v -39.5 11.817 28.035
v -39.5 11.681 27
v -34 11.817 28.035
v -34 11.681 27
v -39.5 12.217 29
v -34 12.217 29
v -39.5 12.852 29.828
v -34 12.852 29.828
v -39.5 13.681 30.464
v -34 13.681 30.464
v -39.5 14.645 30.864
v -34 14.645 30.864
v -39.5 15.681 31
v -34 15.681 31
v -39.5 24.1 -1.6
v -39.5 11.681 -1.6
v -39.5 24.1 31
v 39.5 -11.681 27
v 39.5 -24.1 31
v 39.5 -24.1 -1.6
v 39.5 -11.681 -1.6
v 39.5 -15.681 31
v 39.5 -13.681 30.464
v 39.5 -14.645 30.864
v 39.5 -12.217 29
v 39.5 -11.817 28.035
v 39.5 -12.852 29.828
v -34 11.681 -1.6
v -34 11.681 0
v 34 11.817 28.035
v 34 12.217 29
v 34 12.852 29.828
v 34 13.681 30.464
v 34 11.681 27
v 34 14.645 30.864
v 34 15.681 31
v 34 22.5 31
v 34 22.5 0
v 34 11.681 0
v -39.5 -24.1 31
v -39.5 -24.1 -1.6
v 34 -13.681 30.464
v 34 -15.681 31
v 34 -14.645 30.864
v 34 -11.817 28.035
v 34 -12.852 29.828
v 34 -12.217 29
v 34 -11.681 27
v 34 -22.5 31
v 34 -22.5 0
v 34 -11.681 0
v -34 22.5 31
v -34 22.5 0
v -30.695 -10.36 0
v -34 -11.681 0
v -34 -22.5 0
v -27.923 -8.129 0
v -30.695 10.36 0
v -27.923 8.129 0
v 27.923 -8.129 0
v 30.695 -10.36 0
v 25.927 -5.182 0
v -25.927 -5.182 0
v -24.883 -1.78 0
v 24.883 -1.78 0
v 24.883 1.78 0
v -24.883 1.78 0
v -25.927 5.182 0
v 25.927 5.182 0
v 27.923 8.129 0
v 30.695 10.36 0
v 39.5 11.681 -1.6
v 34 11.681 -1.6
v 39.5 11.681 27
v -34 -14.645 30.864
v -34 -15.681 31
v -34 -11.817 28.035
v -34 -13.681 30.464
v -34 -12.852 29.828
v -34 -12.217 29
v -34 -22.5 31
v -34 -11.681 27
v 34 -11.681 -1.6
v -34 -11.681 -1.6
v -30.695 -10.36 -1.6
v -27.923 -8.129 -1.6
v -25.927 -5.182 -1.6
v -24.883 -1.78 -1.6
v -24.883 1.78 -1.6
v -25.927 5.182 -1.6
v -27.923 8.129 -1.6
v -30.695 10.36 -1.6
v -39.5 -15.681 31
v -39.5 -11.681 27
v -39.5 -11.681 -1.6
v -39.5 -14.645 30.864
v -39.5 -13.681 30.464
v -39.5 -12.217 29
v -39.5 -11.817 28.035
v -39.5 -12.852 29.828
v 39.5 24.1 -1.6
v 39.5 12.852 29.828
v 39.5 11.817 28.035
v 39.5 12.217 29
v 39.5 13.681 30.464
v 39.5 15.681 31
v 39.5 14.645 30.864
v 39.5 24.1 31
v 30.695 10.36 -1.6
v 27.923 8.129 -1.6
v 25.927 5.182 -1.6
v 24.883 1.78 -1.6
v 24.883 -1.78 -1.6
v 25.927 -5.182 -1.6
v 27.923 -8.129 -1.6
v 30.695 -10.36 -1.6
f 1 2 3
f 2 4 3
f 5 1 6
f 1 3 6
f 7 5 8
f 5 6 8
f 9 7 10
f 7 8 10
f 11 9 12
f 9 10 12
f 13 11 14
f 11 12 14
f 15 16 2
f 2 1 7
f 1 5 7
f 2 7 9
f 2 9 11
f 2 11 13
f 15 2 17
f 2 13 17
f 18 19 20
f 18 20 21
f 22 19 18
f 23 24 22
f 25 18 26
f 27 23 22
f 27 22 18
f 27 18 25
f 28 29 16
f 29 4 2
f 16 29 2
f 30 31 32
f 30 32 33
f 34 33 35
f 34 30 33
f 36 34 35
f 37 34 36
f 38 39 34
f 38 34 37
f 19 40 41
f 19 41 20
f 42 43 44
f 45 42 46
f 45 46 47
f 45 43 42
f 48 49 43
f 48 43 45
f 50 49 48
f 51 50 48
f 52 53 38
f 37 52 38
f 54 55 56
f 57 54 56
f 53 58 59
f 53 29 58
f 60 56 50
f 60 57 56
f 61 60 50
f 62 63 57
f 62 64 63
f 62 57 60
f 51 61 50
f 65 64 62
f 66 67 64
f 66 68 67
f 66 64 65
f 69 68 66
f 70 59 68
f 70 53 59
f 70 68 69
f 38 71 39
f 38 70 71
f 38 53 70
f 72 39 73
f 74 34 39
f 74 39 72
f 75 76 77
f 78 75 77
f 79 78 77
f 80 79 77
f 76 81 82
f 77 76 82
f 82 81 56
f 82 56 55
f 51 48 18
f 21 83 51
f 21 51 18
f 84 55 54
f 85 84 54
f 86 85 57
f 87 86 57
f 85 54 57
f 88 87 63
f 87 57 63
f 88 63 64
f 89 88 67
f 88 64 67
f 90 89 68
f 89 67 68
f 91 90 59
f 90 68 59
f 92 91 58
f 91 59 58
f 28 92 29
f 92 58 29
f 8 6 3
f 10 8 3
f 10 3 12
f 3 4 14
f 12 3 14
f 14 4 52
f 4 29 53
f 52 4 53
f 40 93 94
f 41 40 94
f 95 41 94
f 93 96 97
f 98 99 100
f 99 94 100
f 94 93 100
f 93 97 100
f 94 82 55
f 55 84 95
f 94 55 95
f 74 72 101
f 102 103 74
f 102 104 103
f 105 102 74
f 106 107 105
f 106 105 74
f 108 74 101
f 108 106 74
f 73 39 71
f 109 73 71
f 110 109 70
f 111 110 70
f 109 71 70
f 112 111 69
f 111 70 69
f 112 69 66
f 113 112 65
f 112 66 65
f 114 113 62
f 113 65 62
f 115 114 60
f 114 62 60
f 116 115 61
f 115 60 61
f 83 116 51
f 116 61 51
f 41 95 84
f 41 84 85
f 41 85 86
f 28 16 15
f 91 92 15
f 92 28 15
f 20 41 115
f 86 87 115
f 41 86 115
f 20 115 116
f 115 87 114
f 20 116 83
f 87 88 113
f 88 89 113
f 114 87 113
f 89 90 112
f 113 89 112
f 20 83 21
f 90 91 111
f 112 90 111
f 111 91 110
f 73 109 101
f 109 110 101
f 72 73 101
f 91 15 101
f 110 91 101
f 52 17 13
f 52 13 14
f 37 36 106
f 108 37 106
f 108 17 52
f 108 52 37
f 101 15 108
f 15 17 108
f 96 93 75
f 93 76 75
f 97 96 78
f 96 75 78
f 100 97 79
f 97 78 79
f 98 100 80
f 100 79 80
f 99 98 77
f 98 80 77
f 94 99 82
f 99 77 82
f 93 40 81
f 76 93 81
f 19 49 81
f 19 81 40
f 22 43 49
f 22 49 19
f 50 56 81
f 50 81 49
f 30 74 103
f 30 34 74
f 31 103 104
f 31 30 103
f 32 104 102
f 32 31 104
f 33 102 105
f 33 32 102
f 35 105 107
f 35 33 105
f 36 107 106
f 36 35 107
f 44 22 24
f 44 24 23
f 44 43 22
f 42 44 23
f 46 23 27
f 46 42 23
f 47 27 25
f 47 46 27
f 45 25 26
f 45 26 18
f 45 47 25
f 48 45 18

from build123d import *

# Parameters (mm, degrees)
SKETCH029_W          = 79
SKETCH029_H          = 48.2
SKETCH029_W_2        = 68
SKETCH029_H_2        = 45
PAD015_DEPTH         = 31
SKETCH091_W          = 79
SKETCH091_H          = 48.2
PAD054_DEPTH         = 1.6
POCKET037_DEPTH      = 1.601
POCKET037_DEPTH_BACK = 31.001
FILLET009_R          = 4


with BuildPart() as part:
    # Sketch029 → Pad015 (new body)
    with BuildSketch(Plane.XY):
        Rectangle(SKETCH029_W, SKETCH029_H)
        Rectangle(SKETCH029_W_2, SKETCH029_H_2, mode=Mode.SUBTRACT)
    extrude(amount=PAD015_DEPTH)

    # Sketch091 → Pad054 (join)
    with BuildSketch(Plane.XY):
        Rectangle(SKETCH091_W, SKETCH091_H)
    extrude(amount=-PAD054_DEPTH)

    # Sketch030 → Pocket037 (cut, two sides)
    with BuildSketch(Plane.XY) as pocket037_sk:
        with BuildLine():
            ThreePointArc((-34, -11.680646), (-24.75, 0), (-34, 11.680646))
            Line((-34, 11.680646), (-39.5, 11.680646))
            Line((-39.5, 11.680646), (-39.5, -11.680646))
            Line((-34, -11.680646), (-39.5, -11.680646))
        make_face()
        with BuildLine():
            ThreePointArc((34, 11.680646), (24.75, 0), (34, -11.680646))
            Line((34, -11.680646), (39.5, -11.680646))
            Line((39.5, 11.680646), (39.5, -11.680646))
            Line((34, 11.680646), (39.5, 11.680646))
        make_face()
    extrude(amount=-POCKET037_DEPTH, mode=Mode.SUBTRACT)
    extrude(pocket037_sk.sketch, amount=POCKET037_DEPTH_BACK, mode=Mode.SUBTRACT)

    # Fillet009
    fillet009_edges = [part.edges().sort_by_distance(p)[0] for p in [
        (36.75, 11.680646, 31),
        (36.75, -11.680646, 31),
        (-36.75, 11.680646, 31),
        (-36.75, -11.680646, 31),
    ]]
    fillet(fillet009_edges, radius=FILLET009_R)


solid = part.part
